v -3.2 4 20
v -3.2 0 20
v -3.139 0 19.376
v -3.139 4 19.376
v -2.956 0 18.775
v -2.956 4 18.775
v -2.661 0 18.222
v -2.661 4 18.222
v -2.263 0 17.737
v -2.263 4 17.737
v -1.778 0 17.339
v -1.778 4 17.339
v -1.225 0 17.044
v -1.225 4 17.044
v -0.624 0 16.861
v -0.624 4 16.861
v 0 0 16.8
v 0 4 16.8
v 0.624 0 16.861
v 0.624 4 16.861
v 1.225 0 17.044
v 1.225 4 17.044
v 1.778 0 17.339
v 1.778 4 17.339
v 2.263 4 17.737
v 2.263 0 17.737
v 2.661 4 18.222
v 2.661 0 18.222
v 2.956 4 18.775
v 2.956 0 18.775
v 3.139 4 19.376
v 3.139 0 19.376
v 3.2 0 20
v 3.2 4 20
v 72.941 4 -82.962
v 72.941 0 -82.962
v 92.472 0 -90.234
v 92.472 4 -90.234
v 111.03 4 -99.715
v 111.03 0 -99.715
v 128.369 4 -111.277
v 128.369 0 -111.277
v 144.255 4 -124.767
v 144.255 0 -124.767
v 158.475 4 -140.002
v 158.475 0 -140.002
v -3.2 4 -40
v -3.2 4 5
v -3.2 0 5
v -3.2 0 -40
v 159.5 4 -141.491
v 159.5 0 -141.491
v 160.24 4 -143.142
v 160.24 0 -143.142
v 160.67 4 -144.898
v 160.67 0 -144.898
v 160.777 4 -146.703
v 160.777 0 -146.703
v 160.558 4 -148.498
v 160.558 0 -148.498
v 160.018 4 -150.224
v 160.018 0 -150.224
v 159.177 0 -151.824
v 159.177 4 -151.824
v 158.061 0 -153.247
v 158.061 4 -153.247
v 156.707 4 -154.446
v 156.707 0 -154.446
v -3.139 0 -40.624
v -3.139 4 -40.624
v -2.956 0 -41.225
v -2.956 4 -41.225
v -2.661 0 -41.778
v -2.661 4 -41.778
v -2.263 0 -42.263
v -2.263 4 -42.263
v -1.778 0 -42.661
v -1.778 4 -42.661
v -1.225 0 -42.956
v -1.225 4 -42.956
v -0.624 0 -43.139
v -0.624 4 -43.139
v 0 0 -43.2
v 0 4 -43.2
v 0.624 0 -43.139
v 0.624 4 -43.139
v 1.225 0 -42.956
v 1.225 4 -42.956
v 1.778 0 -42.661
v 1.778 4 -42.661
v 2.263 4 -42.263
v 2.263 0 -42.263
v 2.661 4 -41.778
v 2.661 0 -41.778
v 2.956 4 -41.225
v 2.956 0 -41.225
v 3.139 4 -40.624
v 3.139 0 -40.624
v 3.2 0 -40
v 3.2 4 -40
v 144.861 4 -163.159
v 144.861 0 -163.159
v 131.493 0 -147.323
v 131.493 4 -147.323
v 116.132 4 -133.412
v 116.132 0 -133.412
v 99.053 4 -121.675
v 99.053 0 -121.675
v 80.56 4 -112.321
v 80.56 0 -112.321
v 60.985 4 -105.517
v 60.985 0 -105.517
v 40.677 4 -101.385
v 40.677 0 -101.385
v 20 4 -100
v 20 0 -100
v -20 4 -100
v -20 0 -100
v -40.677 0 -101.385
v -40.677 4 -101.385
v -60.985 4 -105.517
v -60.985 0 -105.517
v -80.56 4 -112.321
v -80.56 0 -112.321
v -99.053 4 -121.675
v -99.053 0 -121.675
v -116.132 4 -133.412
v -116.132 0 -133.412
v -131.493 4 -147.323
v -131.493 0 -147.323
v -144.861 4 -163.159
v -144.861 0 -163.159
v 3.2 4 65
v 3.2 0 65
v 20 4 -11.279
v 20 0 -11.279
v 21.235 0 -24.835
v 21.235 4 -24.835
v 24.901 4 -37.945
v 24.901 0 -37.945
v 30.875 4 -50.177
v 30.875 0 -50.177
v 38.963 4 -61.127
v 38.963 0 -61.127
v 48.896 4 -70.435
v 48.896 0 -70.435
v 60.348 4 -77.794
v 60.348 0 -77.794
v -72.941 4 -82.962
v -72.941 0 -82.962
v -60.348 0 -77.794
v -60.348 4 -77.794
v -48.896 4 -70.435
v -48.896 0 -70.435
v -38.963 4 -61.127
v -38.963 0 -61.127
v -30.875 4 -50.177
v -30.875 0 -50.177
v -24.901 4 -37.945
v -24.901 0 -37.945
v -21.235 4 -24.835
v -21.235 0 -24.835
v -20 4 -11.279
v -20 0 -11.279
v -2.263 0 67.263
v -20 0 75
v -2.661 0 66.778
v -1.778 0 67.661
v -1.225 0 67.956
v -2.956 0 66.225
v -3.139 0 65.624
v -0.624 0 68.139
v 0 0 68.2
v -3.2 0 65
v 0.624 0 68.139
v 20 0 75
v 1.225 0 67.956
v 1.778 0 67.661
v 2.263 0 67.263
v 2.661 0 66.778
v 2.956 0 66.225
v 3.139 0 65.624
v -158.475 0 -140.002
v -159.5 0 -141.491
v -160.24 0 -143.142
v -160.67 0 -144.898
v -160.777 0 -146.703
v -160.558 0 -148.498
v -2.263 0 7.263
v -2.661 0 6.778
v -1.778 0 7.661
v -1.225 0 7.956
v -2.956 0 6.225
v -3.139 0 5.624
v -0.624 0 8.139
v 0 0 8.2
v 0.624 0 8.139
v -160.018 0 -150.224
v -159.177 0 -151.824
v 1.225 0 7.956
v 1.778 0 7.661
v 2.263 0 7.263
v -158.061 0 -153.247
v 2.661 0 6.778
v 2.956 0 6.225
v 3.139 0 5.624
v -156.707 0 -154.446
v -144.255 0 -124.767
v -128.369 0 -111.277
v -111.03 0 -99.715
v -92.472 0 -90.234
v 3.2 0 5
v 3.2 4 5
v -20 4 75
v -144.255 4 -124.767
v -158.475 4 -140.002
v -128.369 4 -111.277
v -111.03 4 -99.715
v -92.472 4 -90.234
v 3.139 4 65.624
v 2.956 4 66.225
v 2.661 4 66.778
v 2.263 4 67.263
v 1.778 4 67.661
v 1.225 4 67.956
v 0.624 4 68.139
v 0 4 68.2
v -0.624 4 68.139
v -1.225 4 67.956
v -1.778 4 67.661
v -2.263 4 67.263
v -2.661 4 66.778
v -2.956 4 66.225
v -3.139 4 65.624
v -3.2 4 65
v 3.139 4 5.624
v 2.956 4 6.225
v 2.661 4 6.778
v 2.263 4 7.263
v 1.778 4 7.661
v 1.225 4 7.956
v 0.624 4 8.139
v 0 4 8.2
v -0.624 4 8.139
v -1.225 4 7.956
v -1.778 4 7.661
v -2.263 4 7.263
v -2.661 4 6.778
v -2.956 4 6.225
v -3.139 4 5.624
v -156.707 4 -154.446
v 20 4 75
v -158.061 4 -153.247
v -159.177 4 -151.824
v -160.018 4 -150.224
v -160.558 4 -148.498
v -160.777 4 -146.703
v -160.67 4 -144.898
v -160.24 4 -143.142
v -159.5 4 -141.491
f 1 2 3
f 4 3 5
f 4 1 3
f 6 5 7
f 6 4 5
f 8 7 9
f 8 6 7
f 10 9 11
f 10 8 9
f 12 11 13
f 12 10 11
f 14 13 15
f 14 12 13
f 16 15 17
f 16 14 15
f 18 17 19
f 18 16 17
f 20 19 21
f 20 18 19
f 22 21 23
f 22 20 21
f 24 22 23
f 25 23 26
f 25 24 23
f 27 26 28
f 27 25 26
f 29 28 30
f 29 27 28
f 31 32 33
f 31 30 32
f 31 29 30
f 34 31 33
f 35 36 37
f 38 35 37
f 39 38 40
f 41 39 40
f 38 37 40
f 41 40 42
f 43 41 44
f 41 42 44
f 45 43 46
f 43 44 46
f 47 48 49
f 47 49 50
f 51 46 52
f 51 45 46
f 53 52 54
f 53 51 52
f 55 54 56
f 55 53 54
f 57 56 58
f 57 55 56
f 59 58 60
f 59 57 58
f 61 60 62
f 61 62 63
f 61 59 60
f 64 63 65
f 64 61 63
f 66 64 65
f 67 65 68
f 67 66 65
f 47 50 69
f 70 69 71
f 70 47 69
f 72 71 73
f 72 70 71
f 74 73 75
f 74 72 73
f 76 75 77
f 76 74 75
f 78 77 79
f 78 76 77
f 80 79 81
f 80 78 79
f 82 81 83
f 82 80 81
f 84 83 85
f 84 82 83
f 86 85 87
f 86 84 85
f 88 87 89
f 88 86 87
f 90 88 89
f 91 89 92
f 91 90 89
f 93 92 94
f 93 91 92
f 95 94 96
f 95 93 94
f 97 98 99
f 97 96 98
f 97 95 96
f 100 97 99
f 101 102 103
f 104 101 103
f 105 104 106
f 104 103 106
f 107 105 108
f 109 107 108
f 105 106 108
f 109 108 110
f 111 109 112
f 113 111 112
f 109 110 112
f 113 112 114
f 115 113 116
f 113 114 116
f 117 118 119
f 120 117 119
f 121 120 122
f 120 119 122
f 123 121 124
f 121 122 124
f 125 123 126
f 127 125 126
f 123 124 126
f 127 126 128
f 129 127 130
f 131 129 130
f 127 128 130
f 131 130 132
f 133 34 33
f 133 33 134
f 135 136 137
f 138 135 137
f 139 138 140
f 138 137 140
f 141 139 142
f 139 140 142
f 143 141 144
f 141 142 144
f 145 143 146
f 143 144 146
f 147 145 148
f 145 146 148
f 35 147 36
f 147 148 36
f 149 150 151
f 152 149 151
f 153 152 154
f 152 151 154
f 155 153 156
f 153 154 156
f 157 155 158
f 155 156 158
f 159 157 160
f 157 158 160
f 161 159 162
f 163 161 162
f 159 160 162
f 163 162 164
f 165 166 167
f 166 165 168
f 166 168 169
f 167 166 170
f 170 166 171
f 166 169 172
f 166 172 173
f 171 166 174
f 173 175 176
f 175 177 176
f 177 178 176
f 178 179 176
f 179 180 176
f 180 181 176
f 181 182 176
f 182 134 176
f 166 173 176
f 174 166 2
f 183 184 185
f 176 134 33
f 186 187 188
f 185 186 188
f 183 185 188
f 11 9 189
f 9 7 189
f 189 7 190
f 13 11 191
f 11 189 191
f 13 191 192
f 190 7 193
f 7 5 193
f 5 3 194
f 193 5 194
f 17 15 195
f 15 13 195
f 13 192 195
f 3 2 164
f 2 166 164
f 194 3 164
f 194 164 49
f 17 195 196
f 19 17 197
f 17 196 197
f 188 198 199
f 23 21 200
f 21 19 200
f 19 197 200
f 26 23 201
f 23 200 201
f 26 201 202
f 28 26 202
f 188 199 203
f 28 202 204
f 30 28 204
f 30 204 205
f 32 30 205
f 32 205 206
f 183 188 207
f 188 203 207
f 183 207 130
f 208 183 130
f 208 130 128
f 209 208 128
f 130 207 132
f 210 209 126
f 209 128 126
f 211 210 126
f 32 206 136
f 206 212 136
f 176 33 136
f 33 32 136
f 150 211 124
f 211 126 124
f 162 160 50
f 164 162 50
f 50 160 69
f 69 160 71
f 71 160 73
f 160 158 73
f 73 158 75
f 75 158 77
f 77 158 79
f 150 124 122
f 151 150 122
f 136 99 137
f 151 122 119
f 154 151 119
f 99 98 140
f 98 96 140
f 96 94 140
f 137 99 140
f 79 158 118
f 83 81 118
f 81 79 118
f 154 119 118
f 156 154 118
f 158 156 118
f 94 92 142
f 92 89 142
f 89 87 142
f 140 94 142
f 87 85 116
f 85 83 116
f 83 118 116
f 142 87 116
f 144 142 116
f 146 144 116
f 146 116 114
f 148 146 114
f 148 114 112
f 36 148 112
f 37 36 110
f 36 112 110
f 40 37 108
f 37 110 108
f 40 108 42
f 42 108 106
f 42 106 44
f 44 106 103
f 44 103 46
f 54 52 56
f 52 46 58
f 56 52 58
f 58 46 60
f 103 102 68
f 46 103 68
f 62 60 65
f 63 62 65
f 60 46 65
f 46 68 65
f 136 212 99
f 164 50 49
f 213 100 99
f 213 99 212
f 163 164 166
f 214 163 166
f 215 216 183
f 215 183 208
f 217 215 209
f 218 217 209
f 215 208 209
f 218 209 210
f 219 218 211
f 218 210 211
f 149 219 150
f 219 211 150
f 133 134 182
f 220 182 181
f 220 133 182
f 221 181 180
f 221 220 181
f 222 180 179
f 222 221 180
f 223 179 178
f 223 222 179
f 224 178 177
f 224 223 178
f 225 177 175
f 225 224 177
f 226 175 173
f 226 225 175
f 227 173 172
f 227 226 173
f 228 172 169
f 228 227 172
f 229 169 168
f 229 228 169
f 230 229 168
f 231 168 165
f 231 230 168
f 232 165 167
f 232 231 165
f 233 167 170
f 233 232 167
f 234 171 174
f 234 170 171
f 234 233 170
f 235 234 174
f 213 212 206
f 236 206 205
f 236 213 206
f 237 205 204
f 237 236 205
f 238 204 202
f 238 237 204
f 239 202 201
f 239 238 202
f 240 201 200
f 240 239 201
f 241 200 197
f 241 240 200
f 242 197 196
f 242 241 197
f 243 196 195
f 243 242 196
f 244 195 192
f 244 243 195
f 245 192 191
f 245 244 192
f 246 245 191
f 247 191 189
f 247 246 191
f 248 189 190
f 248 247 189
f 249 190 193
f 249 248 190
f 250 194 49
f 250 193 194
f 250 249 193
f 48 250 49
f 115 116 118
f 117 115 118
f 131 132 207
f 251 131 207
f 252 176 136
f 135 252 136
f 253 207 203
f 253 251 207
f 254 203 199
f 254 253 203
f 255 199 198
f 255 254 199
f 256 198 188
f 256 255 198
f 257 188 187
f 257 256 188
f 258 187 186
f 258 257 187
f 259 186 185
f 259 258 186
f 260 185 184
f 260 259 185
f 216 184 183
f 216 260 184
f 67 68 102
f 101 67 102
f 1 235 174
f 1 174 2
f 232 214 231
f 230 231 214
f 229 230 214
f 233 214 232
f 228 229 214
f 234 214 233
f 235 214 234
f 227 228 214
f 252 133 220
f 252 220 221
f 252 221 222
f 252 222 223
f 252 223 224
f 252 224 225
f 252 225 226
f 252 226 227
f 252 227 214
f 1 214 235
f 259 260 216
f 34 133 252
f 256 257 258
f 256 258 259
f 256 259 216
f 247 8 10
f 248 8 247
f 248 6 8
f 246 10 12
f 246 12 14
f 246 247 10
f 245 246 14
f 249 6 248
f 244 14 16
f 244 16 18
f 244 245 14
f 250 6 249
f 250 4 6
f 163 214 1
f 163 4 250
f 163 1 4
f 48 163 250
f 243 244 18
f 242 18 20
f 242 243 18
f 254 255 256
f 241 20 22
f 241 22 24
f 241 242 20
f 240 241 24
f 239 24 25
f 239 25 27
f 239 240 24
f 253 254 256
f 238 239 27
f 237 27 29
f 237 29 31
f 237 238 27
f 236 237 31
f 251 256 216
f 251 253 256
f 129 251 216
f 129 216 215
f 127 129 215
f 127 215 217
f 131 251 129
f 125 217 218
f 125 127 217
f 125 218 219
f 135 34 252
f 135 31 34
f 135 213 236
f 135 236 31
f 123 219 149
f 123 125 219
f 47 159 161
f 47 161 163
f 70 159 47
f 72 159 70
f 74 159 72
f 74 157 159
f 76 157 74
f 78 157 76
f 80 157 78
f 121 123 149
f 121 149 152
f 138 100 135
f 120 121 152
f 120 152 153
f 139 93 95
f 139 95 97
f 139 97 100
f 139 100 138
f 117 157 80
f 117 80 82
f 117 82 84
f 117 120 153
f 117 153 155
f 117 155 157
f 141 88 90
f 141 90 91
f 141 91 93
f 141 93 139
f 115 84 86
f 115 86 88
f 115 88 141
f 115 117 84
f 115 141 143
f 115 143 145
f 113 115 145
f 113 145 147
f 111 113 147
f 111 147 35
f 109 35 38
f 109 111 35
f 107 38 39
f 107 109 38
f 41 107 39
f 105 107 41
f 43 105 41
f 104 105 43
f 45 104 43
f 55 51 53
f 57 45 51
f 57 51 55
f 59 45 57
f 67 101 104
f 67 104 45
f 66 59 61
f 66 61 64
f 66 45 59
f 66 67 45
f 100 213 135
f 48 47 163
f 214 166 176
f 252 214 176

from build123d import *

# Parameters (mm, degrees)
BOSS_EXTRUDE1_DEPTH = 4
FILLET1_R           = 10
CUT_EXTRUDE1_DEPTH  = 10


with BuildPart() as part:
    # Sketch1 → Boss-Extrude1 (new body)
    with BuildSketch(Plane(origin=(0, 0, 0), x_dir=(1, 0, 0), z_dir=(0, 1, 0))):
        with BuildLine():
            Line((-20, 11.278847861), (-20, -75))
            Line((-20, -75), (20, -75))
            Line((20, -75), (20, 11.278847861))
            ThreePointArc((20, 11.278847861), (34.67002501, 55.835487295), (72.941176471, 82.961539667))
            ThreePointArc((72.941176471, 82.961539667), (124.230373948, 108.248410071), (165, 148.346354961))
            Line((165, 148.346354961), (144.861111111, 163.159361217))
            ThreePointArc((144.861111111, 163.159361217), (89.963208148, 116.688216317), (20, 100))
            Line((20, 100), (-20, 100))
            ThreePointArc((-20, 100), (-89.963208148, 116.688216317), (-144.861111111, 163.159361217))
            Line((-144.861111111, 163.159361217), (-165, 148.346354961))
            ThreePointArc((-165, 148.346354961), (-124.230373948, 108.248410071), (-72.941176471, 82.961539667))
            ThreePointArc((-72.941176471, 82.961539667), (-34.67002501, 55.835487295), (-20, 11.278847861))
        make_face()
    extrude(amount=BOSS_EXTRUDE1_DEPTH)

    # Fillet1
    fillet1_edges = [part.edges().sort_by_distance(p)[0] for p in [
        (-165, 2, -148.346354961),
        (165, 2, -148.346354961),
    ]]
    fillet(fillet1_edges, radius=FILLET1_R)

    # Sketch2 → Cut-Extrude1 (cut)
    with BuildSketch(Plane(origin=(0, 4, 0), x_dir=(1, 0, 0), z_dir=(0, 1, 0))):
        with BuildLine():
            Line((3.2, 40), (3.2, -5))
            ThreePointArc((3.2, -5), (0, -8.2), (-3.2, -5))
            Line((-3.2, -5), (-3.2, 40))
            ThreePointArc((-3.2, 40), (0, 43.2), (3.2, 40))
        make_face()
        with BuildLine():
            Line((3.2, -20), (3.2, -65))
            ThreePointArc((3.2, -65), (0, -68.2), (-3.2, -65))
            Line((-3.2, -65), (-3.2, -20))
            ThreePointArc((-3.2, -20), (0, -16.8), (3.2, -20))
        make_face()
    extrude(amount=-CUT_EXTRUDE1_DEPTH, mode=Mode.SUBTRACT)


solid = part.part
